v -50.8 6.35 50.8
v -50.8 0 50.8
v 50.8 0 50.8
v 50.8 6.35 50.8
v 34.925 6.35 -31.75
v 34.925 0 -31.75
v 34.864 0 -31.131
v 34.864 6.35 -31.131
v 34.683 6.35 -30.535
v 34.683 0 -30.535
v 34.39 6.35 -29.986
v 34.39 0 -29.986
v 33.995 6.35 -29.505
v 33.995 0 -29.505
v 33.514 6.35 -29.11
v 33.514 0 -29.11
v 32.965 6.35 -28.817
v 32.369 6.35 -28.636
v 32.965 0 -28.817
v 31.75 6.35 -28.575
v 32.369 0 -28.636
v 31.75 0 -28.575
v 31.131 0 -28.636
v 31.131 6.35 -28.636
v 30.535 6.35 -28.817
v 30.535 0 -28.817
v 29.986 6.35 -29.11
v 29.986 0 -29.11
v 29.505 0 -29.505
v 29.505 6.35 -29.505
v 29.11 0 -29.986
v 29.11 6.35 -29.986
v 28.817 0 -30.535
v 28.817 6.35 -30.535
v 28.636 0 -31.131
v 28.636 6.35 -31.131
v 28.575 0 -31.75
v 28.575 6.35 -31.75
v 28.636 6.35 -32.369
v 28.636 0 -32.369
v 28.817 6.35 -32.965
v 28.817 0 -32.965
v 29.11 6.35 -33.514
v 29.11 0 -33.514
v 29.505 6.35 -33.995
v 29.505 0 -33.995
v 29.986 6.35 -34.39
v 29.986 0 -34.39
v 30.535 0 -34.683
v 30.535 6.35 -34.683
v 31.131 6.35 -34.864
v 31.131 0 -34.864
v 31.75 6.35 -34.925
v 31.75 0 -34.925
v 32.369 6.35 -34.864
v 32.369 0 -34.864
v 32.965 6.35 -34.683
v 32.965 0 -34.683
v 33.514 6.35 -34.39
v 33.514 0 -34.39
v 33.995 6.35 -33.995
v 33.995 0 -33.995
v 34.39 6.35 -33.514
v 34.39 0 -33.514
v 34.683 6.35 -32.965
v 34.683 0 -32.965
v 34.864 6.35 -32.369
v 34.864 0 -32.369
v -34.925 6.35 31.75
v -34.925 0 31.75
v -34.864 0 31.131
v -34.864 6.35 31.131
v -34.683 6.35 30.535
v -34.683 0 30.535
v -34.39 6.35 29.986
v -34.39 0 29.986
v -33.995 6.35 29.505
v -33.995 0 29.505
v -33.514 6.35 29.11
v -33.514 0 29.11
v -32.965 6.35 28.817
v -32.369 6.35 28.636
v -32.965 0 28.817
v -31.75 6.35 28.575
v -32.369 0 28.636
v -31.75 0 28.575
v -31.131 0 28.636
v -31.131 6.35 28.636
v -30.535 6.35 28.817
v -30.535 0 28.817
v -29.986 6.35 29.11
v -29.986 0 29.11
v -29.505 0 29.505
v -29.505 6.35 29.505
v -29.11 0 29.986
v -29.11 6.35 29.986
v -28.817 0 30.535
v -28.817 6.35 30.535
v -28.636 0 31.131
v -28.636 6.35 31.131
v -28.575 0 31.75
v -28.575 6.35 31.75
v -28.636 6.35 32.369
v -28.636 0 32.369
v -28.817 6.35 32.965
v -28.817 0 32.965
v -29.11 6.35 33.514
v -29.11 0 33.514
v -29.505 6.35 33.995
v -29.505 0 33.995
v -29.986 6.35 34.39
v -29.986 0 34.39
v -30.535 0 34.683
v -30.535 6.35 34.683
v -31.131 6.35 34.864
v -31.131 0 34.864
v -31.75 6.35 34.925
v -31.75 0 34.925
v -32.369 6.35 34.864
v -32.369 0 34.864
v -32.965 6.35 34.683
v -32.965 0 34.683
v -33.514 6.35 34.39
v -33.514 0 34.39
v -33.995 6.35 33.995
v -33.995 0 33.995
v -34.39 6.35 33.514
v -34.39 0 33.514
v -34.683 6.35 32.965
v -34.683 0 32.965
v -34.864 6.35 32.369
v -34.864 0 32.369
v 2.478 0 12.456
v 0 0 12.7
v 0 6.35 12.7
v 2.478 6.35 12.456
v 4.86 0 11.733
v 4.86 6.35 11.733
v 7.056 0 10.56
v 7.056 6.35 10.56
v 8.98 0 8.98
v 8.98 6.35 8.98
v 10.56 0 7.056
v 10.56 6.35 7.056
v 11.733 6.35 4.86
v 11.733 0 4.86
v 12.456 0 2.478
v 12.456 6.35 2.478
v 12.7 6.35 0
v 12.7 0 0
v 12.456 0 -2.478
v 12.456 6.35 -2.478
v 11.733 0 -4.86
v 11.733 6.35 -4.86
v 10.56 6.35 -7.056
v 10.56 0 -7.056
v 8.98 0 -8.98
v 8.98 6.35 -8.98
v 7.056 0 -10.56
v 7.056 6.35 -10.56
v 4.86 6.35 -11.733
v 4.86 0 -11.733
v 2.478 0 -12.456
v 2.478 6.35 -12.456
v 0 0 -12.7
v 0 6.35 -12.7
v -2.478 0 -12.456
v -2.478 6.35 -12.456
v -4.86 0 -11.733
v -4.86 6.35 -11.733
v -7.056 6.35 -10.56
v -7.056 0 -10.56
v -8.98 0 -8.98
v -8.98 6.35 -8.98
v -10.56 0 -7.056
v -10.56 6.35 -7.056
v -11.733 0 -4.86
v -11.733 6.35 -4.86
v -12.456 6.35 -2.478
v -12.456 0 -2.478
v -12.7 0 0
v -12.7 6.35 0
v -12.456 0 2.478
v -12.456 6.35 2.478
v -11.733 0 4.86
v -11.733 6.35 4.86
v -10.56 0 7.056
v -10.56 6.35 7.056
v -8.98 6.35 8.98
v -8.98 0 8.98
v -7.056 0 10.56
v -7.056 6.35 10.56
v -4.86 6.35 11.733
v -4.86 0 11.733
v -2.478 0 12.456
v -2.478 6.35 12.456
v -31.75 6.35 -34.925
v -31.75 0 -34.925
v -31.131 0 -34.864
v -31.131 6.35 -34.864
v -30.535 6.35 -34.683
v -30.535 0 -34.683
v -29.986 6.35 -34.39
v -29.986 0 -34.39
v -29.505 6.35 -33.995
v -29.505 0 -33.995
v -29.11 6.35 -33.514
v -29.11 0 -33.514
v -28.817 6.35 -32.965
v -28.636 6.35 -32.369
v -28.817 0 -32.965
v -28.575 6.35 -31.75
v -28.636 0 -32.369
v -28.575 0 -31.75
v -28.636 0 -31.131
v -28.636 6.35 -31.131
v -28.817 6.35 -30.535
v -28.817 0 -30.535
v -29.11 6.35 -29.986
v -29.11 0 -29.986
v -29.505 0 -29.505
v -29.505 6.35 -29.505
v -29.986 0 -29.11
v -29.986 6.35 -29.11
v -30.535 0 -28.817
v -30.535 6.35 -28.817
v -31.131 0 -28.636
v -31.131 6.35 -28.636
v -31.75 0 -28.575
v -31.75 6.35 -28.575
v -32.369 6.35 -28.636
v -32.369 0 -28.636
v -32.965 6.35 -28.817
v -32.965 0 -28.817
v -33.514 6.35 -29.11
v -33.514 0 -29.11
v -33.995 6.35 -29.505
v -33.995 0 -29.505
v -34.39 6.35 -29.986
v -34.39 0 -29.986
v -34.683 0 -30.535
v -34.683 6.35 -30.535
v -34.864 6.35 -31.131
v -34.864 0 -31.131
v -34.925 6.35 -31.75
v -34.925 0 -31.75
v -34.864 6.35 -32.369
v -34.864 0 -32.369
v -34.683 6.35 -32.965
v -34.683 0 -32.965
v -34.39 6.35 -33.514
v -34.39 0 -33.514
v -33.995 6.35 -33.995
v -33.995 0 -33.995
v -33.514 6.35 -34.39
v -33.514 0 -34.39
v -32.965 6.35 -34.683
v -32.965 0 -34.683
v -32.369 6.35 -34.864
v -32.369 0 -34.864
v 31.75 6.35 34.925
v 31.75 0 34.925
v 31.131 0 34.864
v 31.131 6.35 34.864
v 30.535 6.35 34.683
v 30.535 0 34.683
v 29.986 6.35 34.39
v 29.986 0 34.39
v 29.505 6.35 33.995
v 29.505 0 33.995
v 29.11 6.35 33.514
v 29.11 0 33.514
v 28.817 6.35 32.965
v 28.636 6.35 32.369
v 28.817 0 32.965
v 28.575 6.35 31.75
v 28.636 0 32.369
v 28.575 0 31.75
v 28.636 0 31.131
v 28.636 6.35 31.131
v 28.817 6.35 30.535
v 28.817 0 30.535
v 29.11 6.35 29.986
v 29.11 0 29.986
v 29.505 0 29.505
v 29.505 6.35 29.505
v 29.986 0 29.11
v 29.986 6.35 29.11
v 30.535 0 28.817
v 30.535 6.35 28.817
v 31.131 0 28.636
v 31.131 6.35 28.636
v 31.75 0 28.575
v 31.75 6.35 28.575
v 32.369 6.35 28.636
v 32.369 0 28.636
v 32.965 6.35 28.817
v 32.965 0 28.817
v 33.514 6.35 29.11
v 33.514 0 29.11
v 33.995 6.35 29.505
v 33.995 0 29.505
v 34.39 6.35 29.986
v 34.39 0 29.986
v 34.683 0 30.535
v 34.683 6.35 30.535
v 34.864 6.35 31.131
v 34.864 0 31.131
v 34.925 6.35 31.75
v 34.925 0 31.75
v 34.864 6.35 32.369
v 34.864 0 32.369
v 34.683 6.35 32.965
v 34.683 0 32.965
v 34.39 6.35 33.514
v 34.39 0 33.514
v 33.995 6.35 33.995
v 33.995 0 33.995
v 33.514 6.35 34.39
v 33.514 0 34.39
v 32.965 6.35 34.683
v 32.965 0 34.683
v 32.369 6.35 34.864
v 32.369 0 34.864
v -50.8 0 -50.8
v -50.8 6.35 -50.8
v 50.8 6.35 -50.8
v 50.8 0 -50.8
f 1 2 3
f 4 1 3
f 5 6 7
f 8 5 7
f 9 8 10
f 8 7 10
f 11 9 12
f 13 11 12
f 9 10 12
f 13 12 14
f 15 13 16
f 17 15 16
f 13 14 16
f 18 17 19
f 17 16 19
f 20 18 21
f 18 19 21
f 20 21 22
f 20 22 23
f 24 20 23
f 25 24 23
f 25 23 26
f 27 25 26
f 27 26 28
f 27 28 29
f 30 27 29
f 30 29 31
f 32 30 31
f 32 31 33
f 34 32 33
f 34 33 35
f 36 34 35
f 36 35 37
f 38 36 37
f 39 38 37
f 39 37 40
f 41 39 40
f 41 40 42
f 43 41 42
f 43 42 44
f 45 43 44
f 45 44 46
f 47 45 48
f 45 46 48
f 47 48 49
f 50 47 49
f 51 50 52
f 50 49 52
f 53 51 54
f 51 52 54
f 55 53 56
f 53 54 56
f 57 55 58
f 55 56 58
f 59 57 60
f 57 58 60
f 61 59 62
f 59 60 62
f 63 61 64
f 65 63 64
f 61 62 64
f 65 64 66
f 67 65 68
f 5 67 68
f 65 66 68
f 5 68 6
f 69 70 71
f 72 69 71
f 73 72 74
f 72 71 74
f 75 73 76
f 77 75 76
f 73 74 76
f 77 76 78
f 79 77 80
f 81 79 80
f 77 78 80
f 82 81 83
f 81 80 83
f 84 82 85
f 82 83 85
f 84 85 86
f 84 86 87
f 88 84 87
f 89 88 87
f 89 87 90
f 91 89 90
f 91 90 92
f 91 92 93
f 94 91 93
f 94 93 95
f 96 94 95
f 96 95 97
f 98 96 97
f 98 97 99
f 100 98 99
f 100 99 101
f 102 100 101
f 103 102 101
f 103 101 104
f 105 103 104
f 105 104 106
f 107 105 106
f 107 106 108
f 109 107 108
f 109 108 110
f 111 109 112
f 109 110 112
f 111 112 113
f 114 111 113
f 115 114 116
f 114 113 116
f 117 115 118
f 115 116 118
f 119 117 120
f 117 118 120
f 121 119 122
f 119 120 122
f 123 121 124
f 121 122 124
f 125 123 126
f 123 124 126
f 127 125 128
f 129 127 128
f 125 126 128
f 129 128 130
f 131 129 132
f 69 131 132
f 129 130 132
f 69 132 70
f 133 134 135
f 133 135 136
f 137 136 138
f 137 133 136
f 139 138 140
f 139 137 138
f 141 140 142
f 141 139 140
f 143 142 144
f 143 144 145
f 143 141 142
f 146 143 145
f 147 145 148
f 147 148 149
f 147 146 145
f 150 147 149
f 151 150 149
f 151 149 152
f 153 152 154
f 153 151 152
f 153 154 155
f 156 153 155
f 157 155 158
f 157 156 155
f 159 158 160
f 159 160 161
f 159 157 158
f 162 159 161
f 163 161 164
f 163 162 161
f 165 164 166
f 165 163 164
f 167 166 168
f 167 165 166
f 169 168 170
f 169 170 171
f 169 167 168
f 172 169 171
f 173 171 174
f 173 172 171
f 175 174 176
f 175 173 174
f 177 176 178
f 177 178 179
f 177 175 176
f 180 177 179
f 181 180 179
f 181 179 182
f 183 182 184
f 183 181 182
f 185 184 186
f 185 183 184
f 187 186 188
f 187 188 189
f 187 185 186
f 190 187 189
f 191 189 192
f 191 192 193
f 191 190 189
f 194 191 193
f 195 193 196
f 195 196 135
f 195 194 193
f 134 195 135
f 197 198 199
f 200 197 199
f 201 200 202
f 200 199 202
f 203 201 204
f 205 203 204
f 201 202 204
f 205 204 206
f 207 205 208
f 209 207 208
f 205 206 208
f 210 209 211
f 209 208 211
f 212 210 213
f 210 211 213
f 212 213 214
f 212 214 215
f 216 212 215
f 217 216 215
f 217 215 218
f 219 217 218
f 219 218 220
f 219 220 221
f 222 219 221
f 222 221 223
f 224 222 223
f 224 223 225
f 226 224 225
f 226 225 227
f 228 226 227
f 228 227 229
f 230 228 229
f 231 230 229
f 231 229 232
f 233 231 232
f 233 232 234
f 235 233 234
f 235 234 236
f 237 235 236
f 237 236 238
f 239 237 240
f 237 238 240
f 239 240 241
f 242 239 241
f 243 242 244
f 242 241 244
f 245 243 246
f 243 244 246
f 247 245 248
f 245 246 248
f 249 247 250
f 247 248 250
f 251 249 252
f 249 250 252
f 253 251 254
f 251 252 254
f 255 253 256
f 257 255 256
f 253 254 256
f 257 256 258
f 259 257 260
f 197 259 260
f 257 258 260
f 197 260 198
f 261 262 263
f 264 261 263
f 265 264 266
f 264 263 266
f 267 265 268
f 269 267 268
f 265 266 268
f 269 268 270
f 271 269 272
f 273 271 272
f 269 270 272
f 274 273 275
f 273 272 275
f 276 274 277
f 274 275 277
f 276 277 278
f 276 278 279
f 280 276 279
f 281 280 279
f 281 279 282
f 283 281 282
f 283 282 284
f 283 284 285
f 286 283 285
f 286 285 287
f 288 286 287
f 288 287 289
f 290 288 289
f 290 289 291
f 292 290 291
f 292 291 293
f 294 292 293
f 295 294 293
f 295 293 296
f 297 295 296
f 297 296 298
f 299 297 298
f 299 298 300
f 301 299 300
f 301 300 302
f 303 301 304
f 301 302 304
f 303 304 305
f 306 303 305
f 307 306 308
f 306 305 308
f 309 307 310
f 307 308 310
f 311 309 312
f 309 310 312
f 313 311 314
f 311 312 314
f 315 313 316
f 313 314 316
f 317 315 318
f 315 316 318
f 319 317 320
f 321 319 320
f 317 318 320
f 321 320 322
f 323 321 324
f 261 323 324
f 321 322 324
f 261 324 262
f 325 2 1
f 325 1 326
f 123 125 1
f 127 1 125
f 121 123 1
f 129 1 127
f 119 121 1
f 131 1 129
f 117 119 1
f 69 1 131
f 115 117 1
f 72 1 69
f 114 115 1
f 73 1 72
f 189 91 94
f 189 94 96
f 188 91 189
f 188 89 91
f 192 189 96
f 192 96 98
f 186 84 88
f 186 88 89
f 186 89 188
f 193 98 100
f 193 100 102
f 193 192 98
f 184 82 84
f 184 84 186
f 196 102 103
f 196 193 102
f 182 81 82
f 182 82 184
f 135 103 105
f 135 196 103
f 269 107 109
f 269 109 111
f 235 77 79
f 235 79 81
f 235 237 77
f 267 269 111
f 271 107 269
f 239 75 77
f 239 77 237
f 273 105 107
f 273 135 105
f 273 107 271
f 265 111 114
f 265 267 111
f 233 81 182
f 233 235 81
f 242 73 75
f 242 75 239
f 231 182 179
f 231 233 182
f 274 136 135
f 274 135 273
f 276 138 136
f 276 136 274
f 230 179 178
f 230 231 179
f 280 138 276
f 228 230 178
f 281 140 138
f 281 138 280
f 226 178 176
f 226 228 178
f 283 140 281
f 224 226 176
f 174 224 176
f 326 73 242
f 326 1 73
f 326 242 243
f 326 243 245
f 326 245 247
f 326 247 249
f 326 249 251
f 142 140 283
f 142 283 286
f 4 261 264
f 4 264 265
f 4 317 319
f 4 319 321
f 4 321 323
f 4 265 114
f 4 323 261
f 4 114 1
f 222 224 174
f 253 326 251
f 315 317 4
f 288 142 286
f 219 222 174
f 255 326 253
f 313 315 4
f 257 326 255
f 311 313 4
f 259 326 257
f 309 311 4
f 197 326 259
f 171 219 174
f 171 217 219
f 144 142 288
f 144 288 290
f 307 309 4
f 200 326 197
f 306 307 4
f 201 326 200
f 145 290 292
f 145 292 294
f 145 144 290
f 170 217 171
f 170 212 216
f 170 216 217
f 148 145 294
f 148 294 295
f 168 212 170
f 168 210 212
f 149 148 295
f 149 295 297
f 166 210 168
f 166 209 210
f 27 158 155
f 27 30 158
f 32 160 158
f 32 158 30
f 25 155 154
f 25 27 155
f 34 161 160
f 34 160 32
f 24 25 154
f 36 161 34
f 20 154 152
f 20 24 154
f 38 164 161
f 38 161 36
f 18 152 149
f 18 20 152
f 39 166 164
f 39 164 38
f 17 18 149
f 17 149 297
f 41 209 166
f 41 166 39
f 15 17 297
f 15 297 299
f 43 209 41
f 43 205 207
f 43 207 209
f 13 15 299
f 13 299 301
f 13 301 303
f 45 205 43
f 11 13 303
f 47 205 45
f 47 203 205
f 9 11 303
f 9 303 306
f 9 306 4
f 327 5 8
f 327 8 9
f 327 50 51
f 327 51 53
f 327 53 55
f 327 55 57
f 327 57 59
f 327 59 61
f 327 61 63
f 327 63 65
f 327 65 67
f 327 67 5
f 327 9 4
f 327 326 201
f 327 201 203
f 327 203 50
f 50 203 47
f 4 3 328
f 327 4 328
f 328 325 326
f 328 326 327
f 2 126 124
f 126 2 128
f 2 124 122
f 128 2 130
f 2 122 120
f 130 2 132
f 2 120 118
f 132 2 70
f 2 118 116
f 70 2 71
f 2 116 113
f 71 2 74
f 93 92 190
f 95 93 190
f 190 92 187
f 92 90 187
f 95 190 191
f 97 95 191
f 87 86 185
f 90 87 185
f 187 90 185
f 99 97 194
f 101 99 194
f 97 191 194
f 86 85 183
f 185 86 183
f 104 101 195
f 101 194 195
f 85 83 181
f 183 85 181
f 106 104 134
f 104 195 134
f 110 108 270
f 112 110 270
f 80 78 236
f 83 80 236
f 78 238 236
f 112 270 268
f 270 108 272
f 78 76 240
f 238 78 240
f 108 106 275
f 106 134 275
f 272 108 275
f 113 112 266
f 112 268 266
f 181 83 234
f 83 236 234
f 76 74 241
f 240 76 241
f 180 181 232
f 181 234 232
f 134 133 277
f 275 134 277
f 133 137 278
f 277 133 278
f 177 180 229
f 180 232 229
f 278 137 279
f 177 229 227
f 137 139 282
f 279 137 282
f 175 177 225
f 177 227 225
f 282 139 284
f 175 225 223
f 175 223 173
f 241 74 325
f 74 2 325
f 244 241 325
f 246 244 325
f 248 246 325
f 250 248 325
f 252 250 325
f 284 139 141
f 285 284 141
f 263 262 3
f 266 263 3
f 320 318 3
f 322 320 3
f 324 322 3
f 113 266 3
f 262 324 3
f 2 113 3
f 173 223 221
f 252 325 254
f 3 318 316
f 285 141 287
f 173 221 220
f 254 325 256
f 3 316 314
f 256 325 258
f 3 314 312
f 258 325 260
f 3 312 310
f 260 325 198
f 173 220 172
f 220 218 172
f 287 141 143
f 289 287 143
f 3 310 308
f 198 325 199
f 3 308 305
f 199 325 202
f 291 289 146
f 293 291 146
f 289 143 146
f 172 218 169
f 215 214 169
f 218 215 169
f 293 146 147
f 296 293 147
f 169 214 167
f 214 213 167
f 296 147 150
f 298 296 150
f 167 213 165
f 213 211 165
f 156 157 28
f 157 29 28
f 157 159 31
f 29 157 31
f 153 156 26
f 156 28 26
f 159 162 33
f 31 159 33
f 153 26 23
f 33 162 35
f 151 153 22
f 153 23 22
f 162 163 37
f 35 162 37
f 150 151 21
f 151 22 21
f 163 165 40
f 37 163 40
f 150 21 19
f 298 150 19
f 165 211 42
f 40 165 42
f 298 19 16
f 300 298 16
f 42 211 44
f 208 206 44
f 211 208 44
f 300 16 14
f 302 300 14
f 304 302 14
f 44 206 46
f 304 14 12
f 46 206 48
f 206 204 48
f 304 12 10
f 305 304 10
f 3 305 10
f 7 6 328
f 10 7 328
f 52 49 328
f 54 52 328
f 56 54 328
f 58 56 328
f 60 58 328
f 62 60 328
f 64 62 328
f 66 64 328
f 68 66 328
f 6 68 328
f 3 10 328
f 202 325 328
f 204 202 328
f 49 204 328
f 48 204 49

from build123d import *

# Parameters (mm, degrees)
SKETCH1_W                   = 101.6
SKETCH1_H                   = 101.6
SKETCH1_R                   = 12.7
BOSS_EXTRUDE1_DEPTH         = 6.35
F_1_4_0_25_DIAMETER_HOLE1_D = 6.35
CIRPATTERN1_COUNT           = 4


with BuildPart() as part:
    # Sketch1 → Boss-Extrude1 (new body)
    with BuildSketch(Plane(origin=(0, 0, 0), x_dir=(1, 0, 0), z_dir=(0, 1, 0))):
        Rectangle(SKETCH1_W, SKETCH1_H)
        with Locations(Location((0, 0, 0), (0, 0, 270))):
            Circle(SKETCH1_R, mode=Mode.SUBTRACT)
    extrude(amount=BOSS_EXTRUDE1_DEPTH)

    # 1/4 (0.25) Diameter Hole1 (through all)
    with Locations(Plane(origin=(0, 6.35, 0), x_dir=(1, 0, 0), z_dir=(0, 1, 0))):
        with Locations((-31.75, -31.75)):
            f_1_4_0_25_diameter_hole1 = Hole(F_1_4_0_25_DIAMETER_HOLE1_D / 2)

    # CirPattern1: 1/4 (0.25) Diameter Hole1 ×4 about axis
    cirpattern1_axis = Axis((0, 0, 0), (0, 1, 0))
    for i in range(1, CIRPATTERN1_COUNT):
        add(f_1_4_0_25_diameter_hole1.rotate(cirpattern1_axis, i * 360 / CIRPATTERN1_COUNT), mode=Mode.SUBTRACT)


solid = part.part
